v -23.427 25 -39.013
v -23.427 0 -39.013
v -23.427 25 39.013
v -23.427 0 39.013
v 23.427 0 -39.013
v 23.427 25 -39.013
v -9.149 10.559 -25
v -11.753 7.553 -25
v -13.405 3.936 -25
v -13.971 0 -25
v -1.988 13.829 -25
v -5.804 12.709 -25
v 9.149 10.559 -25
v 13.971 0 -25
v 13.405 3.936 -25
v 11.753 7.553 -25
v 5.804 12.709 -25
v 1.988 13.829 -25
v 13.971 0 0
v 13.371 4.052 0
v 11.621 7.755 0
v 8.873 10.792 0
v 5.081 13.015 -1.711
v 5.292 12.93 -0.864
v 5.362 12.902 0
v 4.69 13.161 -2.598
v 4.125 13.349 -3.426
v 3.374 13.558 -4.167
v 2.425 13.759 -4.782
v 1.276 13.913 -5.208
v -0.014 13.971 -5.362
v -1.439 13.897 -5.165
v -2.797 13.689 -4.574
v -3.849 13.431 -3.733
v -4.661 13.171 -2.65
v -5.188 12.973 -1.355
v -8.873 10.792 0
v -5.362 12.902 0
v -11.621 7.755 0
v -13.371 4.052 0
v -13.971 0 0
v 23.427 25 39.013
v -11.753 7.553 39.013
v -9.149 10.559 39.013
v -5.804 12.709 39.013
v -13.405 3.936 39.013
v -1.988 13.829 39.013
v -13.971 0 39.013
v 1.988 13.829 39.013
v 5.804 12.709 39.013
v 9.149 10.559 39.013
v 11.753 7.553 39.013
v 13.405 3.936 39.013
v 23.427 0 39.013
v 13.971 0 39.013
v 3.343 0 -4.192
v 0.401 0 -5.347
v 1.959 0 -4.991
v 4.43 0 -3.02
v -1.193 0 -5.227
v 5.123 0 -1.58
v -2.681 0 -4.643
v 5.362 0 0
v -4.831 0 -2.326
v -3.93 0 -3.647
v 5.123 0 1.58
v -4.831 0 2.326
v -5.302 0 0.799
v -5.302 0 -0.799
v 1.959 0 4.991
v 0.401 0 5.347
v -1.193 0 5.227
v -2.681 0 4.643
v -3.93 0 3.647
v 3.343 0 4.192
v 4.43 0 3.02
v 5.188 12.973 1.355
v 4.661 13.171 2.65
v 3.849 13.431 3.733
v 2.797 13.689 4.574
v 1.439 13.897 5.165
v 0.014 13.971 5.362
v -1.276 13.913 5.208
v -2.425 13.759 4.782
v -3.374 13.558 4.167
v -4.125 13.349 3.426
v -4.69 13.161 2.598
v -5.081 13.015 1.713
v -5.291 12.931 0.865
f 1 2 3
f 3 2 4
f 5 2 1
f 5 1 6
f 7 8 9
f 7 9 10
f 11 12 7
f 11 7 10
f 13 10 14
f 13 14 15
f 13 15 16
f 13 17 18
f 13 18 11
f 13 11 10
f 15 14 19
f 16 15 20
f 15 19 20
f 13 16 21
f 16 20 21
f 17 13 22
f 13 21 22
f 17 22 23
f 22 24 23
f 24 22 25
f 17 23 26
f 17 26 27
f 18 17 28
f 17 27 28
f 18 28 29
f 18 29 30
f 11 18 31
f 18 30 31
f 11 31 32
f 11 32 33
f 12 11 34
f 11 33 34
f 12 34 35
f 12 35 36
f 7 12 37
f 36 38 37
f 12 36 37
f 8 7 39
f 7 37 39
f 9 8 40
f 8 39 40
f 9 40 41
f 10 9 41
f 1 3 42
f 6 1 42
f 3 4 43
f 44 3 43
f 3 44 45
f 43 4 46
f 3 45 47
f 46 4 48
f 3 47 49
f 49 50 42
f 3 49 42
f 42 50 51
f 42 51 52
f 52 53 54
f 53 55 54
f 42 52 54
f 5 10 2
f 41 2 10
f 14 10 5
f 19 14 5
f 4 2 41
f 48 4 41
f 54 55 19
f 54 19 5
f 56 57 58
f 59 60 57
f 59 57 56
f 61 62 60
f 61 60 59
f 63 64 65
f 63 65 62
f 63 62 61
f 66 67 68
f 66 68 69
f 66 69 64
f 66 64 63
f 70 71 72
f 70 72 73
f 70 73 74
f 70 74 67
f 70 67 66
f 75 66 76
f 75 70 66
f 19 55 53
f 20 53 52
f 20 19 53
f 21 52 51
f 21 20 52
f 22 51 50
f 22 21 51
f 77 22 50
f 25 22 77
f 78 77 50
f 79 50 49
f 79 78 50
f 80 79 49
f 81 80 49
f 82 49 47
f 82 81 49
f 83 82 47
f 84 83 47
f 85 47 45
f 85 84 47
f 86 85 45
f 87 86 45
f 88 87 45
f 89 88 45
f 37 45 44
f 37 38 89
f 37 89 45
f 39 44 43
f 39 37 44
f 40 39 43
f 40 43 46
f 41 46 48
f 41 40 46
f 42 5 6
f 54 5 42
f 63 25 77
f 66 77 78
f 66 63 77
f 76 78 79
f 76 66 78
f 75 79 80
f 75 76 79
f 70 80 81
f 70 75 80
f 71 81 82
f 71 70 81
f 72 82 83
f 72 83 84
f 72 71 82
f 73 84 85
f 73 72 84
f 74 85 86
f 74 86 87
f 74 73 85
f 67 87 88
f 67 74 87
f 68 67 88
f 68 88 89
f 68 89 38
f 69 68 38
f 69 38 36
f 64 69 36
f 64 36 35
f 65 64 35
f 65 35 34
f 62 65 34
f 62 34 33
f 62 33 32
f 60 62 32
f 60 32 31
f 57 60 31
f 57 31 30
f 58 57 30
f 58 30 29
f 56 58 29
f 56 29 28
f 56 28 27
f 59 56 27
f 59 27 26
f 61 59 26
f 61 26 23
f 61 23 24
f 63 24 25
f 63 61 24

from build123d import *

# Parameters (mm, degrees)
F0_W          = 46.853558
F0_H          = 78.02628
F1_DEPTH      = 25
F2_R          = 13.971362
F3_DEPTH      = 42.8
F3_DEPTH_BACK = 25
F4_R          = 5.361649
F5_DEPTH      = 22.4


with BuildPart() as f1:
    # F0 (on Front) → F1 (new body)
    with BuildSketch(Plane.XZ):
        Rectangle(F0_W, F0_H)
    extrude(amount=-F1_DEPTH)

    # F2 (on Top) → F3 (cut, two sides)
    with BuildSketch(Plane.XY) as f3_sk:
        Circle(F2_R)
    extrude(amount=F3_DEPTH, mode=Mode.SUBTRACT)
    extrude(f3_sk.sketch, amount=-F3_DEPTH_BACK, mode=Mode.SUBTRACT)

    # F4 (on Front) → F5 (join)
    with BuildSketch(Plane.XZ):
        Circle(F4_R)
    extrude(amount=-F5_DEPTH)


solid = f1.part
